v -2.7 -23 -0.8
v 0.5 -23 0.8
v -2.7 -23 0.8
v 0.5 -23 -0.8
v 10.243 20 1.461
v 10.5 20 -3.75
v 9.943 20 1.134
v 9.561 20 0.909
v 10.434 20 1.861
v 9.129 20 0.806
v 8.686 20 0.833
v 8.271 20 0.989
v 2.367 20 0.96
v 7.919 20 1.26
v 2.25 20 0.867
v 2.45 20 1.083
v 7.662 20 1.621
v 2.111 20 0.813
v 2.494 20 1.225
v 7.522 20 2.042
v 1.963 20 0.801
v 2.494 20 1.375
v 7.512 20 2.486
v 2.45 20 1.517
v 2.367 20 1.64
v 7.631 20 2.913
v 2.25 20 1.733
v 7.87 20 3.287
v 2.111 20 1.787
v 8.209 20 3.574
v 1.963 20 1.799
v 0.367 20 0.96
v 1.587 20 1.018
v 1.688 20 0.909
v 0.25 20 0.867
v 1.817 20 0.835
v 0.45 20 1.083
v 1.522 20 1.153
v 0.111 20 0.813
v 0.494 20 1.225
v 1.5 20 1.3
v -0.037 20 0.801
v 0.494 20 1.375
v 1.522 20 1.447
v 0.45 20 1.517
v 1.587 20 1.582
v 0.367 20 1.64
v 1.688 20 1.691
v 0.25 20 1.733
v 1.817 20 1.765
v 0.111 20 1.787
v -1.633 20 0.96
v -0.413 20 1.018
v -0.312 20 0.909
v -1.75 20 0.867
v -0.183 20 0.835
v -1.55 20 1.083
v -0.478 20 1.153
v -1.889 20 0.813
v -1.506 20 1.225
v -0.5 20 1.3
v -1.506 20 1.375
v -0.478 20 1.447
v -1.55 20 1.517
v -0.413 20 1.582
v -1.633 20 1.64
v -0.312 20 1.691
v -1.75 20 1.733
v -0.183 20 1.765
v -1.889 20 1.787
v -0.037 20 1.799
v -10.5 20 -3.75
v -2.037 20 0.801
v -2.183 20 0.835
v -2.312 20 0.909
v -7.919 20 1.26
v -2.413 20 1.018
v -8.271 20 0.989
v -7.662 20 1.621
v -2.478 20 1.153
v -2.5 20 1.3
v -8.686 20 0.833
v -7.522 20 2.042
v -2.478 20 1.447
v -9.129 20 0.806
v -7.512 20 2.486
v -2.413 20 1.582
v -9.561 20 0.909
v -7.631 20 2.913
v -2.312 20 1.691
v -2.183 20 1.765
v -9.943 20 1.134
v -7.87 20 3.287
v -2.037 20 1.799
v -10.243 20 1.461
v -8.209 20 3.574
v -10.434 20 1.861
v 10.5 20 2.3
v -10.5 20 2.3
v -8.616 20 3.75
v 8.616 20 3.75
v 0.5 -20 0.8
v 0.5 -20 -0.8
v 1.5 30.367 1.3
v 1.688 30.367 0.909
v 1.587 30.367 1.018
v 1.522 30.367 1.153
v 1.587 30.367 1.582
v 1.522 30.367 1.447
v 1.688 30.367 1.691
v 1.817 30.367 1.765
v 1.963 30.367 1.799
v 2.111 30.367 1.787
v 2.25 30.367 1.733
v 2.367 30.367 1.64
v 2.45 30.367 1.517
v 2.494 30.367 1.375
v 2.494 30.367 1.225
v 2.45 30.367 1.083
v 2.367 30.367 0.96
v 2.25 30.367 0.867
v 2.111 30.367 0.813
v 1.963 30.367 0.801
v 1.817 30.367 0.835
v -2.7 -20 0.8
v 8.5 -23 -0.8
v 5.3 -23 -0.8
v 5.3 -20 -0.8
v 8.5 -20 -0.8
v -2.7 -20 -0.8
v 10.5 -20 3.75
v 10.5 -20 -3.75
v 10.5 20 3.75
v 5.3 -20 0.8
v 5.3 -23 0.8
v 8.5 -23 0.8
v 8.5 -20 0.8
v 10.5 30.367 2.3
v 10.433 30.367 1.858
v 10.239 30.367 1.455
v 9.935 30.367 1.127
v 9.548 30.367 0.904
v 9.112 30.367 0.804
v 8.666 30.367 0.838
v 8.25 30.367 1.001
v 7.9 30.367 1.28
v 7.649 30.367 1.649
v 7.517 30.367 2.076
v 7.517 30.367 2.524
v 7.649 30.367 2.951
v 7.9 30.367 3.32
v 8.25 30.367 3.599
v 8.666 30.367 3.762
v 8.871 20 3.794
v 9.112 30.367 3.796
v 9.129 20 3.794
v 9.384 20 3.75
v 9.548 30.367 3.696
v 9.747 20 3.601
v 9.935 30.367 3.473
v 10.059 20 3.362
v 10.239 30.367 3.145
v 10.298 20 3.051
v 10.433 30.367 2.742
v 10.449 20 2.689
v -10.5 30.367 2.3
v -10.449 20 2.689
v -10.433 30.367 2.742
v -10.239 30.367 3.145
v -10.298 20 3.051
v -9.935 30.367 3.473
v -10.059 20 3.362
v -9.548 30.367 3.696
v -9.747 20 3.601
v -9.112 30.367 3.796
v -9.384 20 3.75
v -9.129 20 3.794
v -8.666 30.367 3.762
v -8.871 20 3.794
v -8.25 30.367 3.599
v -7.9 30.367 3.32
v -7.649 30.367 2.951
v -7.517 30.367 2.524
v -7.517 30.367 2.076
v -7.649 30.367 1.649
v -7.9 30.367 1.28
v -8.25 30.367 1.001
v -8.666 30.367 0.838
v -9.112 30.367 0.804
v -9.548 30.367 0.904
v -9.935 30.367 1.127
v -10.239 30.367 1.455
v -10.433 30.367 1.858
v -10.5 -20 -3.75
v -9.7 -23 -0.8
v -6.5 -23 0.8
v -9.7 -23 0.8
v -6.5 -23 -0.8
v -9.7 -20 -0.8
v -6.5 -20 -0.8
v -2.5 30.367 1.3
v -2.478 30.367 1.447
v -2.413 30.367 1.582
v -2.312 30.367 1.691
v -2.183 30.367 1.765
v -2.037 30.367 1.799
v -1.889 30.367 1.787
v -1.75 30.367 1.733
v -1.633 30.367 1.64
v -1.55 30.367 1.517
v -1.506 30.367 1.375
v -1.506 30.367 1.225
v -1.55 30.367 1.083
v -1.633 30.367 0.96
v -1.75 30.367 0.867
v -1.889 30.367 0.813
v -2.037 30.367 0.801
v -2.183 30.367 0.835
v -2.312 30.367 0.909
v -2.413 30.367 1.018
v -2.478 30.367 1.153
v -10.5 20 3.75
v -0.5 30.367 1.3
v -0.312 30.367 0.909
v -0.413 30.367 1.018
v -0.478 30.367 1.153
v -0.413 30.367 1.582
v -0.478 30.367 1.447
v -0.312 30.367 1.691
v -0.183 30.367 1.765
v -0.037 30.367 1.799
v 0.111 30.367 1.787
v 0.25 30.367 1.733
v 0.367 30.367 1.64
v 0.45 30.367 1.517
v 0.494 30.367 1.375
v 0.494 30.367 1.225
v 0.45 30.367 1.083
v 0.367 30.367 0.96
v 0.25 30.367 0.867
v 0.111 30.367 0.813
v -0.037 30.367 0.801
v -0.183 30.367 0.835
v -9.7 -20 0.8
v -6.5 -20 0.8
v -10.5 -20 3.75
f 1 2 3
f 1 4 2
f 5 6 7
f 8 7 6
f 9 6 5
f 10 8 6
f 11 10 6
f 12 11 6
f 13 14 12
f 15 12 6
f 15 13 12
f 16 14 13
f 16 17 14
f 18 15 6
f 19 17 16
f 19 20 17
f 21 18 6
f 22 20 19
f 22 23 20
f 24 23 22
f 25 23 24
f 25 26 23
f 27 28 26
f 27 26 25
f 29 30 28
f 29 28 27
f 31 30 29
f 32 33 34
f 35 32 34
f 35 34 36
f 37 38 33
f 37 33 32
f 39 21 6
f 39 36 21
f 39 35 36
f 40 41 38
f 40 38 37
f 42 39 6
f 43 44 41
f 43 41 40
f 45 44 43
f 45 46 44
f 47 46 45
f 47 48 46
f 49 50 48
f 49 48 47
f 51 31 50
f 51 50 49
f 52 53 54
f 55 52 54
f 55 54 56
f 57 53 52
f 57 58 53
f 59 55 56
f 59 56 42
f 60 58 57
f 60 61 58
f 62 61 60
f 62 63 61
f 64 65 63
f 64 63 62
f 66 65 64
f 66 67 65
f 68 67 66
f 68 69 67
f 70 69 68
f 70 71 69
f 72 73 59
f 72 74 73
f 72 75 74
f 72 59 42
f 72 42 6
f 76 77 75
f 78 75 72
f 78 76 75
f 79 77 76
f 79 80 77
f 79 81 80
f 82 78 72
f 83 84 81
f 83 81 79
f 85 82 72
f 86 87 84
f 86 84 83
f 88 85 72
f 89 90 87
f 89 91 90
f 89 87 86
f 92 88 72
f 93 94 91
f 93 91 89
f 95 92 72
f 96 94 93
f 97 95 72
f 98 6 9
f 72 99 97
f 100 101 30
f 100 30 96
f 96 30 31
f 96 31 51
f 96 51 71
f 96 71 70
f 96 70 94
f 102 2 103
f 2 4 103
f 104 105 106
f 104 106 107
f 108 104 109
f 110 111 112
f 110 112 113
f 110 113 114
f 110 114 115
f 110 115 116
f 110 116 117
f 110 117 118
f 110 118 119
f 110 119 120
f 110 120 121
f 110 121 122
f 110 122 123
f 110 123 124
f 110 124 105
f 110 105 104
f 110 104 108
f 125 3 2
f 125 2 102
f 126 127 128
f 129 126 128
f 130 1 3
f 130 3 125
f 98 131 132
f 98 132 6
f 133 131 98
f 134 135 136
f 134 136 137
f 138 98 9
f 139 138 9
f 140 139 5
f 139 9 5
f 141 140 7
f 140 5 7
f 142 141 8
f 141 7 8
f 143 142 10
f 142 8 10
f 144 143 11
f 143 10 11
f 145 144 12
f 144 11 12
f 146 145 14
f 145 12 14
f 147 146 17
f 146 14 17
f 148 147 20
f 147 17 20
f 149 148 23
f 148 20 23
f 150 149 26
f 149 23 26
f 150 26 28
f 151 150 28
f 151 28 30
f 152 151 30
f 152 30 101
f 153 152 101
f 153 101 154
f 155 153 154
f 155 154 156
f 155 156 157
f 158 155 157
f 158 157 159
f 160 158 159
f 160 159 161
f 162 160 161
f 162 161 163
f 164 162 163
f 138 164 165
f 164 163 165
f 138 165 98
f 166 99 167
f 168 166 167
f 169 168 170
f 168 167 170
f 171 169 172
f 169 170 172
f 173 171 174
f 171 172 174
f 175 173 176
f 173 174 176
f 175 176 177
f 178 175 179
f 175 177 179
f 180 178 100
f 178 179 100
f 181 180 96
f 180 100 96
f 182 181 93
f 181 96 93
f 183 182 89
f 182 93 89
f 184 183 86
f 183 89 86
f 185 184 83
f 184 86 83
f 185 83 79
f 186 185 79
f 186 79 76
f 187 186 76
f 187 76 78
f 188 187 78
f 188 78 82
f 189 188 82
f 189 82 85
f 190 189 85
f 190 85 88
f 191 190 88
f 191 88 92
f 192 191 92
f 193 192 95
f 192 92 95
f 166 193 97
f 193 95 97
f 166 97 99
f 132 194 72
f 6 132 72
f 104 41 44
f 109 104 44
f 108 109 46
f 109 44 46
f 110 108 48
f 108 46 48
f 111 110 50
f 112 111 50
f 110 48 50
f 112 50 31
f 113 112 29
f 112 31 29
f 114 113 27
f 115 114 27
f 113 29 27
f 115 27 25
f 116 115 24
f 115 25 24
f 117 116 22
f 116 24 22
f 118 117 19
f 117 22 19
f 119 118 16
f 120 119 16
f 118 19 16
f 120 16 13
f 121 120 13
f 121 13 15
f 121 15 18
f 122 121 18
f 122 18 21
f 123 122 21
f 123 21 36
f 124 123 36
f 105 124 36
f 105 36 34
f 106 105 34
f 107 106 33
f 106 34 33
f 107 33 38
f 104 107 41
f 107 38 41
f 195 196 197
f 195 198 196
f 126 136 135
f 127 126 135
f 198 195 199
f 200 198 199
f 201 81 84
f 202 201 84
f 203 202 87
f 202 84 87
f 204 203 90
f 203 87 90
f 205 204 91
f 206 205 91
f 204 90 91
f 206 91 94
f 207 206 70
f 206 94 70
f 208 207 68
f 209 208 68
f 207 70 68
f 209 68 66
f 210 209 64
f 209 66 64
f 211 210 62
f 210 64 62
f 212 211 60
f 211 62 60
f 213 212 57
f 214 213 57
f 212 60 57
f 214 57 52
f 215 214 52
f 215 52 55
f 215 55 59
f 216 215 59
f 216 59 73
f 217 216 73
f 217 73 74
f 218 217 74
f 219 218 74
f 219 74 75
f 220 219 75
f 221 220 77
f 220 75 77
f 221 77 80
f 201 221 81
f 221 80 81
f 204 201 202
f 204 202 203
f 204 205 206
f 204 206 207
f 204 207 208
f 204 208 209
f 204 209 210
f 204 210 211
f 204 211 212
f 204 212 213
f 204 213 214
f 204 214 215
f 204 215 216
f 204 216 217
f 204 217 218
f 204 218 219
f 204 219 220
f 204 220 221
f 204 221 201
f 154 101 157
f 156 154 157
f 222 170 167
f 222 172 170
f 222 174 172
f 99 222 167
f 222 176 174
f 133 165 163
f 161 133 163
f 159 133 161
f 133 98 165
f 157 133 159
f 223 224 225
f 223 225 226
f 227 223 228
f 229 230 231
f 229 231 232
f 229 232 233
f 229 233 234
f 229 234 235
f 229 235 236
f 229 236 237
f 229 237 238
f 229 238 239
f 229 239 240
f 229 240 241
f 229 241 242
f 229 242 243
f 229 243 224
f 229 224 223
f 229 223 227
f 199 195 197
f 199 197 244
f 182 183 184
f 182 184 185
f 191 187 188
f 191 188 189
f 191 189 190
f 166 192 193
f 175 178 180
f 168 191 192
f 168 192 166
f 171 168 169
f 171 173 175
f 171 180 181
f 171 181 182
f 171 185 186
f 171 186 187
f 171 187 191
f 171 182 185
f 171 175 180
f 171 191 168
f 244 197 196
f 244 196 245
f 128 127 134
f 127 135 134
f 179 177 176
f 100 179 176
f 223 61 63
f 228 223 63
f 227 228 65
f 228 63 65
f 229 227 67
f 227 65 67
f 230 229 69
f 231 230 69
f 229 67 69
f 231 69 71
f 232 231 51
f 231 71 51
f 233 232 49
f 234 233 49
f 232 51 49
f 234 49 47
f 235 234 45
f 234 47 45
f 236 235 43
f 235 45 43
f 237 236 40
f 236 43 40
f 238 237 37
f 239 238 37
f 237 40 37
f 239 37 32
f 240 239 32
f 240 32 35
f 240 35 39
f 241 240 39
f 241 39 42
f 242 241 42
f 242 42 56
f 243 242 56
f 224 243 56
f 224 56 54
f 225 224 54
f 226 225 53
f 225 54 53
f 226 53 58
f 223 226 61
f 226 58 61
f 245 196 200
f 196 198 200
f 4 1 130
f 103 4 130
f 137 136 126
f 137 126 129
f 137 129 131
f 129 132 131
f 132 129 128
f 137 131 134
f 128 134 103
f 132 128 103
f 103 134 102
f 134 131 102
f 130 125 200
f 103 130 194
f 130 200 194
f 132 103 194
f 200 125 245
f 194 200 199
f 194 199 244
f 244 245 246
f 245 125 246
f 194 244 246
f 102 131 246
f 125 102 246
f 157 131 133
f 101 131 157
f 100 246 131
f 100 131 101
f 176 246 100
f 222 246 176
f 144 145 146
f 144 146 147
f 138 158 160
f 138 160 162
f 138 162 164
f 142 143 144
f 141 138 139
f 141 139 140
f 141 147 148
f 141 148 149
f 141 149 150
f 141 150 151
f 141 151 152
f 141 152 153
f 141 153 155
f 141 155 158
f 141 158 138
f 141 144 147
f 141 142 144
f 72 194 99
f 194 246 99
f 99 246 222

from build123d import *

# Parameters (mm, degrees)
SKETCH1_W           = 40
SKETCH1_H           = 21
BOSS_EXTRUDE1_DEPTH = 3.75
SKETCH2_W           = 3
SKETCH2_H           = 3.2
BOSS_EXTRUDE2_DEPTH = 0.8
SKETCH3_R           = 1.5
SKETCH3_R_2         = 0.5
BOSS_EXTRUDE3_DEPTH = 10.366683148


with BuildPart() as part:
    # Sketch1 → Boss-Extrude1 (new, symmetric)
    with BuildSketch(Plane(origin=(0, 0, 0), x_dir=(0, 1, 0), z_dir=(0, 0, 1))):
        Rectangle(SKETCH1_W, SKETCH1_H)
    extrude(amount=BOSS_EXTRUDE1_DEPTH, both=True)

    # Sketch2 → Boss-Extrude2 (add, symmetric)
    with BuildSketch(Plane(origin=(0, 0, 0), x_dir=(0, 1, 0), z_dir=(0, 0, 1))):
        with Locations((-21.5, 8.1)):
            Rectangle(SKETCH2_W, SKETCH2_H)
        with Locations((-21.5, 1.1)):
            Rectangle(SKETCH2_W, SKETCH2_H)
        with Locations((-21.5, -6.9)):
            Rectangle(SKETCH2_W, SKETCH2_H)
    extrude(amount=BOSS_EXTRUDE2_DEPTH, both=True)

    # Sketch3 → Boss-Extrude3 (add)
    with BuildSketch(Plane(origin=(0, 20, 0), x_dir=(-1, 0, 0), z_dir=(0, 1, 0))):
        with Locations(Location((-9, 2.3, 0), (0, 0, 180))):
            Circle(SKETCH3_R)
        with Locations((9, 2.3)):
            Circle(SKETCH3_R)
        with Locations((0, 1.3)):
            Circle(SKETCH3_R_2)
        with Locations((2, 1.3)):
            Circle(SKETCH3_R_2)
        with Locations((-2, 1.3)):
            Circle(SKETCH3_R_2)
    extrude(amount=BOSS_EXTRUDE3_DEPTH)


solid = part.part
